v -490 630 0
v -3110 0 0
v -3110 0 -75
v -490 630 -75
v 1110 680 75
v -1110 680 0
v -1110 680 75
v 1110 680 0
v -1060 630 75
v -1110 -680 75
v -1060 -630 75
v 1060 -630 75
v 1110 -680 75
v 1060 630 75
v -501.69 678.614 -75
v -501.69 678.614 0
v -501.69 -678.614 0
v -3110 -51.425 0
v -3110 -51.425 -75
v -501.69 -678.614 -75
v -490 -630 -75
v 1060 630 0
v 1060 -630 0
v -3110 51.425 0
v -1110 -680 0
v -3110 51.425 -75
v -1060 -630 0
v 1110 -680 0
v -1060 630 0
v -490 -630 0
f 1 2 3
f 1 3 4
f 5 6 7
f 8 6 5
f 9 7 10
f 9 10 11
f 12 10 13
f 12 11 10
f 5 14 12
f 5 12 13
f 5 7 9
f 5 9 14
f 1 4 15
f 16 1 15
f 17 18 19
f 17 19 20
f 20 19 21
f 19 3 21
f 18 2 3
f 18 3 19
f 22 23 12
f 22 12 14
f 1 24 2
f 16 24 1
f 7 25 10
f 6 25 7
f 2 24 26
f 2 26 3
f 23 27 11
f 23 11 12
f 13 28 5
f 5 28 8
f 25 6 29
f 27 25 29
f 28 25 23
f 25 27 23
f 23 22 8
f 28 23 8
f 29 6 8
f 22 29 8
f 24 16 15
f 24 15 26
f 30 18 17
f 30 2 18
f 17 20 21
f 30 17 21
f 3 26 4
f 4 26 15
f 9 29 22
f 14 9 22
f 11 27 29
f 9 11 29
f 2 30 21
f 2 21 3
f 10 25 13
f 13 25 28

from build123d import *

# Parameters (mm, degrees)
F0_W     = 2220
F0_H     = 1360
F0_W_2   = 2120
F0_H_2   = 1260
F1_DEPTH = 75
F3_DEPTH = 75


with BuildPart() as f1:
    # F0 (on Top) → F1 (new body)
    with BuildSketch(Plane.XY):
        Rectangle(F0_W, F0_H)
        Rectangle(F0_W_2, F0_H_2, mode=Mode.SUBTRACT)
    extrude(amount=F1_DEPTH)


with BuildPart() as f3:
    # F2 (on Top) → F3 (new body)
    with BuildSketch(Plane.XY):
        Polygon((-3110, -51.4251897689), (-1110, -532.3412203032), (-1110, -480.9160305344), (-3110, 0), align=None)
        Polygon((-1110, -480.9160305344), (-1110, -532.3412203032), (-703.8634876103, -630), (-490, -630), align=None)
        Polygon((-490, -630), (-703.8634876103, -630), (-501.689699948, -678.6143077203), align=None)
    extrude(amount=-F3_DEPTH)


with BuildPart() as f3b:
    # F2 (on Top) → F3, piece 2 (new body)
    with BuildSketch(Plane.XY):
        Polygon((-1110, 480.9160305344), (-1110, 532.3412203032), (-3110, 51.4251897689), (-3110, 0), align=None)
        Polygon((-703.8634876103, 630), (-1110, 532.3412203032), (-1110, 480.9160305344), (-490, 630), align=None)
        Polygon((-501.689699948, 678.6143077203), (-703.8634876103, 630), (-490, 630), align=None)
    extrude(amount=-F3_DEPTH)


solid = Compound([f1.part, f3.part, f3b.part])
